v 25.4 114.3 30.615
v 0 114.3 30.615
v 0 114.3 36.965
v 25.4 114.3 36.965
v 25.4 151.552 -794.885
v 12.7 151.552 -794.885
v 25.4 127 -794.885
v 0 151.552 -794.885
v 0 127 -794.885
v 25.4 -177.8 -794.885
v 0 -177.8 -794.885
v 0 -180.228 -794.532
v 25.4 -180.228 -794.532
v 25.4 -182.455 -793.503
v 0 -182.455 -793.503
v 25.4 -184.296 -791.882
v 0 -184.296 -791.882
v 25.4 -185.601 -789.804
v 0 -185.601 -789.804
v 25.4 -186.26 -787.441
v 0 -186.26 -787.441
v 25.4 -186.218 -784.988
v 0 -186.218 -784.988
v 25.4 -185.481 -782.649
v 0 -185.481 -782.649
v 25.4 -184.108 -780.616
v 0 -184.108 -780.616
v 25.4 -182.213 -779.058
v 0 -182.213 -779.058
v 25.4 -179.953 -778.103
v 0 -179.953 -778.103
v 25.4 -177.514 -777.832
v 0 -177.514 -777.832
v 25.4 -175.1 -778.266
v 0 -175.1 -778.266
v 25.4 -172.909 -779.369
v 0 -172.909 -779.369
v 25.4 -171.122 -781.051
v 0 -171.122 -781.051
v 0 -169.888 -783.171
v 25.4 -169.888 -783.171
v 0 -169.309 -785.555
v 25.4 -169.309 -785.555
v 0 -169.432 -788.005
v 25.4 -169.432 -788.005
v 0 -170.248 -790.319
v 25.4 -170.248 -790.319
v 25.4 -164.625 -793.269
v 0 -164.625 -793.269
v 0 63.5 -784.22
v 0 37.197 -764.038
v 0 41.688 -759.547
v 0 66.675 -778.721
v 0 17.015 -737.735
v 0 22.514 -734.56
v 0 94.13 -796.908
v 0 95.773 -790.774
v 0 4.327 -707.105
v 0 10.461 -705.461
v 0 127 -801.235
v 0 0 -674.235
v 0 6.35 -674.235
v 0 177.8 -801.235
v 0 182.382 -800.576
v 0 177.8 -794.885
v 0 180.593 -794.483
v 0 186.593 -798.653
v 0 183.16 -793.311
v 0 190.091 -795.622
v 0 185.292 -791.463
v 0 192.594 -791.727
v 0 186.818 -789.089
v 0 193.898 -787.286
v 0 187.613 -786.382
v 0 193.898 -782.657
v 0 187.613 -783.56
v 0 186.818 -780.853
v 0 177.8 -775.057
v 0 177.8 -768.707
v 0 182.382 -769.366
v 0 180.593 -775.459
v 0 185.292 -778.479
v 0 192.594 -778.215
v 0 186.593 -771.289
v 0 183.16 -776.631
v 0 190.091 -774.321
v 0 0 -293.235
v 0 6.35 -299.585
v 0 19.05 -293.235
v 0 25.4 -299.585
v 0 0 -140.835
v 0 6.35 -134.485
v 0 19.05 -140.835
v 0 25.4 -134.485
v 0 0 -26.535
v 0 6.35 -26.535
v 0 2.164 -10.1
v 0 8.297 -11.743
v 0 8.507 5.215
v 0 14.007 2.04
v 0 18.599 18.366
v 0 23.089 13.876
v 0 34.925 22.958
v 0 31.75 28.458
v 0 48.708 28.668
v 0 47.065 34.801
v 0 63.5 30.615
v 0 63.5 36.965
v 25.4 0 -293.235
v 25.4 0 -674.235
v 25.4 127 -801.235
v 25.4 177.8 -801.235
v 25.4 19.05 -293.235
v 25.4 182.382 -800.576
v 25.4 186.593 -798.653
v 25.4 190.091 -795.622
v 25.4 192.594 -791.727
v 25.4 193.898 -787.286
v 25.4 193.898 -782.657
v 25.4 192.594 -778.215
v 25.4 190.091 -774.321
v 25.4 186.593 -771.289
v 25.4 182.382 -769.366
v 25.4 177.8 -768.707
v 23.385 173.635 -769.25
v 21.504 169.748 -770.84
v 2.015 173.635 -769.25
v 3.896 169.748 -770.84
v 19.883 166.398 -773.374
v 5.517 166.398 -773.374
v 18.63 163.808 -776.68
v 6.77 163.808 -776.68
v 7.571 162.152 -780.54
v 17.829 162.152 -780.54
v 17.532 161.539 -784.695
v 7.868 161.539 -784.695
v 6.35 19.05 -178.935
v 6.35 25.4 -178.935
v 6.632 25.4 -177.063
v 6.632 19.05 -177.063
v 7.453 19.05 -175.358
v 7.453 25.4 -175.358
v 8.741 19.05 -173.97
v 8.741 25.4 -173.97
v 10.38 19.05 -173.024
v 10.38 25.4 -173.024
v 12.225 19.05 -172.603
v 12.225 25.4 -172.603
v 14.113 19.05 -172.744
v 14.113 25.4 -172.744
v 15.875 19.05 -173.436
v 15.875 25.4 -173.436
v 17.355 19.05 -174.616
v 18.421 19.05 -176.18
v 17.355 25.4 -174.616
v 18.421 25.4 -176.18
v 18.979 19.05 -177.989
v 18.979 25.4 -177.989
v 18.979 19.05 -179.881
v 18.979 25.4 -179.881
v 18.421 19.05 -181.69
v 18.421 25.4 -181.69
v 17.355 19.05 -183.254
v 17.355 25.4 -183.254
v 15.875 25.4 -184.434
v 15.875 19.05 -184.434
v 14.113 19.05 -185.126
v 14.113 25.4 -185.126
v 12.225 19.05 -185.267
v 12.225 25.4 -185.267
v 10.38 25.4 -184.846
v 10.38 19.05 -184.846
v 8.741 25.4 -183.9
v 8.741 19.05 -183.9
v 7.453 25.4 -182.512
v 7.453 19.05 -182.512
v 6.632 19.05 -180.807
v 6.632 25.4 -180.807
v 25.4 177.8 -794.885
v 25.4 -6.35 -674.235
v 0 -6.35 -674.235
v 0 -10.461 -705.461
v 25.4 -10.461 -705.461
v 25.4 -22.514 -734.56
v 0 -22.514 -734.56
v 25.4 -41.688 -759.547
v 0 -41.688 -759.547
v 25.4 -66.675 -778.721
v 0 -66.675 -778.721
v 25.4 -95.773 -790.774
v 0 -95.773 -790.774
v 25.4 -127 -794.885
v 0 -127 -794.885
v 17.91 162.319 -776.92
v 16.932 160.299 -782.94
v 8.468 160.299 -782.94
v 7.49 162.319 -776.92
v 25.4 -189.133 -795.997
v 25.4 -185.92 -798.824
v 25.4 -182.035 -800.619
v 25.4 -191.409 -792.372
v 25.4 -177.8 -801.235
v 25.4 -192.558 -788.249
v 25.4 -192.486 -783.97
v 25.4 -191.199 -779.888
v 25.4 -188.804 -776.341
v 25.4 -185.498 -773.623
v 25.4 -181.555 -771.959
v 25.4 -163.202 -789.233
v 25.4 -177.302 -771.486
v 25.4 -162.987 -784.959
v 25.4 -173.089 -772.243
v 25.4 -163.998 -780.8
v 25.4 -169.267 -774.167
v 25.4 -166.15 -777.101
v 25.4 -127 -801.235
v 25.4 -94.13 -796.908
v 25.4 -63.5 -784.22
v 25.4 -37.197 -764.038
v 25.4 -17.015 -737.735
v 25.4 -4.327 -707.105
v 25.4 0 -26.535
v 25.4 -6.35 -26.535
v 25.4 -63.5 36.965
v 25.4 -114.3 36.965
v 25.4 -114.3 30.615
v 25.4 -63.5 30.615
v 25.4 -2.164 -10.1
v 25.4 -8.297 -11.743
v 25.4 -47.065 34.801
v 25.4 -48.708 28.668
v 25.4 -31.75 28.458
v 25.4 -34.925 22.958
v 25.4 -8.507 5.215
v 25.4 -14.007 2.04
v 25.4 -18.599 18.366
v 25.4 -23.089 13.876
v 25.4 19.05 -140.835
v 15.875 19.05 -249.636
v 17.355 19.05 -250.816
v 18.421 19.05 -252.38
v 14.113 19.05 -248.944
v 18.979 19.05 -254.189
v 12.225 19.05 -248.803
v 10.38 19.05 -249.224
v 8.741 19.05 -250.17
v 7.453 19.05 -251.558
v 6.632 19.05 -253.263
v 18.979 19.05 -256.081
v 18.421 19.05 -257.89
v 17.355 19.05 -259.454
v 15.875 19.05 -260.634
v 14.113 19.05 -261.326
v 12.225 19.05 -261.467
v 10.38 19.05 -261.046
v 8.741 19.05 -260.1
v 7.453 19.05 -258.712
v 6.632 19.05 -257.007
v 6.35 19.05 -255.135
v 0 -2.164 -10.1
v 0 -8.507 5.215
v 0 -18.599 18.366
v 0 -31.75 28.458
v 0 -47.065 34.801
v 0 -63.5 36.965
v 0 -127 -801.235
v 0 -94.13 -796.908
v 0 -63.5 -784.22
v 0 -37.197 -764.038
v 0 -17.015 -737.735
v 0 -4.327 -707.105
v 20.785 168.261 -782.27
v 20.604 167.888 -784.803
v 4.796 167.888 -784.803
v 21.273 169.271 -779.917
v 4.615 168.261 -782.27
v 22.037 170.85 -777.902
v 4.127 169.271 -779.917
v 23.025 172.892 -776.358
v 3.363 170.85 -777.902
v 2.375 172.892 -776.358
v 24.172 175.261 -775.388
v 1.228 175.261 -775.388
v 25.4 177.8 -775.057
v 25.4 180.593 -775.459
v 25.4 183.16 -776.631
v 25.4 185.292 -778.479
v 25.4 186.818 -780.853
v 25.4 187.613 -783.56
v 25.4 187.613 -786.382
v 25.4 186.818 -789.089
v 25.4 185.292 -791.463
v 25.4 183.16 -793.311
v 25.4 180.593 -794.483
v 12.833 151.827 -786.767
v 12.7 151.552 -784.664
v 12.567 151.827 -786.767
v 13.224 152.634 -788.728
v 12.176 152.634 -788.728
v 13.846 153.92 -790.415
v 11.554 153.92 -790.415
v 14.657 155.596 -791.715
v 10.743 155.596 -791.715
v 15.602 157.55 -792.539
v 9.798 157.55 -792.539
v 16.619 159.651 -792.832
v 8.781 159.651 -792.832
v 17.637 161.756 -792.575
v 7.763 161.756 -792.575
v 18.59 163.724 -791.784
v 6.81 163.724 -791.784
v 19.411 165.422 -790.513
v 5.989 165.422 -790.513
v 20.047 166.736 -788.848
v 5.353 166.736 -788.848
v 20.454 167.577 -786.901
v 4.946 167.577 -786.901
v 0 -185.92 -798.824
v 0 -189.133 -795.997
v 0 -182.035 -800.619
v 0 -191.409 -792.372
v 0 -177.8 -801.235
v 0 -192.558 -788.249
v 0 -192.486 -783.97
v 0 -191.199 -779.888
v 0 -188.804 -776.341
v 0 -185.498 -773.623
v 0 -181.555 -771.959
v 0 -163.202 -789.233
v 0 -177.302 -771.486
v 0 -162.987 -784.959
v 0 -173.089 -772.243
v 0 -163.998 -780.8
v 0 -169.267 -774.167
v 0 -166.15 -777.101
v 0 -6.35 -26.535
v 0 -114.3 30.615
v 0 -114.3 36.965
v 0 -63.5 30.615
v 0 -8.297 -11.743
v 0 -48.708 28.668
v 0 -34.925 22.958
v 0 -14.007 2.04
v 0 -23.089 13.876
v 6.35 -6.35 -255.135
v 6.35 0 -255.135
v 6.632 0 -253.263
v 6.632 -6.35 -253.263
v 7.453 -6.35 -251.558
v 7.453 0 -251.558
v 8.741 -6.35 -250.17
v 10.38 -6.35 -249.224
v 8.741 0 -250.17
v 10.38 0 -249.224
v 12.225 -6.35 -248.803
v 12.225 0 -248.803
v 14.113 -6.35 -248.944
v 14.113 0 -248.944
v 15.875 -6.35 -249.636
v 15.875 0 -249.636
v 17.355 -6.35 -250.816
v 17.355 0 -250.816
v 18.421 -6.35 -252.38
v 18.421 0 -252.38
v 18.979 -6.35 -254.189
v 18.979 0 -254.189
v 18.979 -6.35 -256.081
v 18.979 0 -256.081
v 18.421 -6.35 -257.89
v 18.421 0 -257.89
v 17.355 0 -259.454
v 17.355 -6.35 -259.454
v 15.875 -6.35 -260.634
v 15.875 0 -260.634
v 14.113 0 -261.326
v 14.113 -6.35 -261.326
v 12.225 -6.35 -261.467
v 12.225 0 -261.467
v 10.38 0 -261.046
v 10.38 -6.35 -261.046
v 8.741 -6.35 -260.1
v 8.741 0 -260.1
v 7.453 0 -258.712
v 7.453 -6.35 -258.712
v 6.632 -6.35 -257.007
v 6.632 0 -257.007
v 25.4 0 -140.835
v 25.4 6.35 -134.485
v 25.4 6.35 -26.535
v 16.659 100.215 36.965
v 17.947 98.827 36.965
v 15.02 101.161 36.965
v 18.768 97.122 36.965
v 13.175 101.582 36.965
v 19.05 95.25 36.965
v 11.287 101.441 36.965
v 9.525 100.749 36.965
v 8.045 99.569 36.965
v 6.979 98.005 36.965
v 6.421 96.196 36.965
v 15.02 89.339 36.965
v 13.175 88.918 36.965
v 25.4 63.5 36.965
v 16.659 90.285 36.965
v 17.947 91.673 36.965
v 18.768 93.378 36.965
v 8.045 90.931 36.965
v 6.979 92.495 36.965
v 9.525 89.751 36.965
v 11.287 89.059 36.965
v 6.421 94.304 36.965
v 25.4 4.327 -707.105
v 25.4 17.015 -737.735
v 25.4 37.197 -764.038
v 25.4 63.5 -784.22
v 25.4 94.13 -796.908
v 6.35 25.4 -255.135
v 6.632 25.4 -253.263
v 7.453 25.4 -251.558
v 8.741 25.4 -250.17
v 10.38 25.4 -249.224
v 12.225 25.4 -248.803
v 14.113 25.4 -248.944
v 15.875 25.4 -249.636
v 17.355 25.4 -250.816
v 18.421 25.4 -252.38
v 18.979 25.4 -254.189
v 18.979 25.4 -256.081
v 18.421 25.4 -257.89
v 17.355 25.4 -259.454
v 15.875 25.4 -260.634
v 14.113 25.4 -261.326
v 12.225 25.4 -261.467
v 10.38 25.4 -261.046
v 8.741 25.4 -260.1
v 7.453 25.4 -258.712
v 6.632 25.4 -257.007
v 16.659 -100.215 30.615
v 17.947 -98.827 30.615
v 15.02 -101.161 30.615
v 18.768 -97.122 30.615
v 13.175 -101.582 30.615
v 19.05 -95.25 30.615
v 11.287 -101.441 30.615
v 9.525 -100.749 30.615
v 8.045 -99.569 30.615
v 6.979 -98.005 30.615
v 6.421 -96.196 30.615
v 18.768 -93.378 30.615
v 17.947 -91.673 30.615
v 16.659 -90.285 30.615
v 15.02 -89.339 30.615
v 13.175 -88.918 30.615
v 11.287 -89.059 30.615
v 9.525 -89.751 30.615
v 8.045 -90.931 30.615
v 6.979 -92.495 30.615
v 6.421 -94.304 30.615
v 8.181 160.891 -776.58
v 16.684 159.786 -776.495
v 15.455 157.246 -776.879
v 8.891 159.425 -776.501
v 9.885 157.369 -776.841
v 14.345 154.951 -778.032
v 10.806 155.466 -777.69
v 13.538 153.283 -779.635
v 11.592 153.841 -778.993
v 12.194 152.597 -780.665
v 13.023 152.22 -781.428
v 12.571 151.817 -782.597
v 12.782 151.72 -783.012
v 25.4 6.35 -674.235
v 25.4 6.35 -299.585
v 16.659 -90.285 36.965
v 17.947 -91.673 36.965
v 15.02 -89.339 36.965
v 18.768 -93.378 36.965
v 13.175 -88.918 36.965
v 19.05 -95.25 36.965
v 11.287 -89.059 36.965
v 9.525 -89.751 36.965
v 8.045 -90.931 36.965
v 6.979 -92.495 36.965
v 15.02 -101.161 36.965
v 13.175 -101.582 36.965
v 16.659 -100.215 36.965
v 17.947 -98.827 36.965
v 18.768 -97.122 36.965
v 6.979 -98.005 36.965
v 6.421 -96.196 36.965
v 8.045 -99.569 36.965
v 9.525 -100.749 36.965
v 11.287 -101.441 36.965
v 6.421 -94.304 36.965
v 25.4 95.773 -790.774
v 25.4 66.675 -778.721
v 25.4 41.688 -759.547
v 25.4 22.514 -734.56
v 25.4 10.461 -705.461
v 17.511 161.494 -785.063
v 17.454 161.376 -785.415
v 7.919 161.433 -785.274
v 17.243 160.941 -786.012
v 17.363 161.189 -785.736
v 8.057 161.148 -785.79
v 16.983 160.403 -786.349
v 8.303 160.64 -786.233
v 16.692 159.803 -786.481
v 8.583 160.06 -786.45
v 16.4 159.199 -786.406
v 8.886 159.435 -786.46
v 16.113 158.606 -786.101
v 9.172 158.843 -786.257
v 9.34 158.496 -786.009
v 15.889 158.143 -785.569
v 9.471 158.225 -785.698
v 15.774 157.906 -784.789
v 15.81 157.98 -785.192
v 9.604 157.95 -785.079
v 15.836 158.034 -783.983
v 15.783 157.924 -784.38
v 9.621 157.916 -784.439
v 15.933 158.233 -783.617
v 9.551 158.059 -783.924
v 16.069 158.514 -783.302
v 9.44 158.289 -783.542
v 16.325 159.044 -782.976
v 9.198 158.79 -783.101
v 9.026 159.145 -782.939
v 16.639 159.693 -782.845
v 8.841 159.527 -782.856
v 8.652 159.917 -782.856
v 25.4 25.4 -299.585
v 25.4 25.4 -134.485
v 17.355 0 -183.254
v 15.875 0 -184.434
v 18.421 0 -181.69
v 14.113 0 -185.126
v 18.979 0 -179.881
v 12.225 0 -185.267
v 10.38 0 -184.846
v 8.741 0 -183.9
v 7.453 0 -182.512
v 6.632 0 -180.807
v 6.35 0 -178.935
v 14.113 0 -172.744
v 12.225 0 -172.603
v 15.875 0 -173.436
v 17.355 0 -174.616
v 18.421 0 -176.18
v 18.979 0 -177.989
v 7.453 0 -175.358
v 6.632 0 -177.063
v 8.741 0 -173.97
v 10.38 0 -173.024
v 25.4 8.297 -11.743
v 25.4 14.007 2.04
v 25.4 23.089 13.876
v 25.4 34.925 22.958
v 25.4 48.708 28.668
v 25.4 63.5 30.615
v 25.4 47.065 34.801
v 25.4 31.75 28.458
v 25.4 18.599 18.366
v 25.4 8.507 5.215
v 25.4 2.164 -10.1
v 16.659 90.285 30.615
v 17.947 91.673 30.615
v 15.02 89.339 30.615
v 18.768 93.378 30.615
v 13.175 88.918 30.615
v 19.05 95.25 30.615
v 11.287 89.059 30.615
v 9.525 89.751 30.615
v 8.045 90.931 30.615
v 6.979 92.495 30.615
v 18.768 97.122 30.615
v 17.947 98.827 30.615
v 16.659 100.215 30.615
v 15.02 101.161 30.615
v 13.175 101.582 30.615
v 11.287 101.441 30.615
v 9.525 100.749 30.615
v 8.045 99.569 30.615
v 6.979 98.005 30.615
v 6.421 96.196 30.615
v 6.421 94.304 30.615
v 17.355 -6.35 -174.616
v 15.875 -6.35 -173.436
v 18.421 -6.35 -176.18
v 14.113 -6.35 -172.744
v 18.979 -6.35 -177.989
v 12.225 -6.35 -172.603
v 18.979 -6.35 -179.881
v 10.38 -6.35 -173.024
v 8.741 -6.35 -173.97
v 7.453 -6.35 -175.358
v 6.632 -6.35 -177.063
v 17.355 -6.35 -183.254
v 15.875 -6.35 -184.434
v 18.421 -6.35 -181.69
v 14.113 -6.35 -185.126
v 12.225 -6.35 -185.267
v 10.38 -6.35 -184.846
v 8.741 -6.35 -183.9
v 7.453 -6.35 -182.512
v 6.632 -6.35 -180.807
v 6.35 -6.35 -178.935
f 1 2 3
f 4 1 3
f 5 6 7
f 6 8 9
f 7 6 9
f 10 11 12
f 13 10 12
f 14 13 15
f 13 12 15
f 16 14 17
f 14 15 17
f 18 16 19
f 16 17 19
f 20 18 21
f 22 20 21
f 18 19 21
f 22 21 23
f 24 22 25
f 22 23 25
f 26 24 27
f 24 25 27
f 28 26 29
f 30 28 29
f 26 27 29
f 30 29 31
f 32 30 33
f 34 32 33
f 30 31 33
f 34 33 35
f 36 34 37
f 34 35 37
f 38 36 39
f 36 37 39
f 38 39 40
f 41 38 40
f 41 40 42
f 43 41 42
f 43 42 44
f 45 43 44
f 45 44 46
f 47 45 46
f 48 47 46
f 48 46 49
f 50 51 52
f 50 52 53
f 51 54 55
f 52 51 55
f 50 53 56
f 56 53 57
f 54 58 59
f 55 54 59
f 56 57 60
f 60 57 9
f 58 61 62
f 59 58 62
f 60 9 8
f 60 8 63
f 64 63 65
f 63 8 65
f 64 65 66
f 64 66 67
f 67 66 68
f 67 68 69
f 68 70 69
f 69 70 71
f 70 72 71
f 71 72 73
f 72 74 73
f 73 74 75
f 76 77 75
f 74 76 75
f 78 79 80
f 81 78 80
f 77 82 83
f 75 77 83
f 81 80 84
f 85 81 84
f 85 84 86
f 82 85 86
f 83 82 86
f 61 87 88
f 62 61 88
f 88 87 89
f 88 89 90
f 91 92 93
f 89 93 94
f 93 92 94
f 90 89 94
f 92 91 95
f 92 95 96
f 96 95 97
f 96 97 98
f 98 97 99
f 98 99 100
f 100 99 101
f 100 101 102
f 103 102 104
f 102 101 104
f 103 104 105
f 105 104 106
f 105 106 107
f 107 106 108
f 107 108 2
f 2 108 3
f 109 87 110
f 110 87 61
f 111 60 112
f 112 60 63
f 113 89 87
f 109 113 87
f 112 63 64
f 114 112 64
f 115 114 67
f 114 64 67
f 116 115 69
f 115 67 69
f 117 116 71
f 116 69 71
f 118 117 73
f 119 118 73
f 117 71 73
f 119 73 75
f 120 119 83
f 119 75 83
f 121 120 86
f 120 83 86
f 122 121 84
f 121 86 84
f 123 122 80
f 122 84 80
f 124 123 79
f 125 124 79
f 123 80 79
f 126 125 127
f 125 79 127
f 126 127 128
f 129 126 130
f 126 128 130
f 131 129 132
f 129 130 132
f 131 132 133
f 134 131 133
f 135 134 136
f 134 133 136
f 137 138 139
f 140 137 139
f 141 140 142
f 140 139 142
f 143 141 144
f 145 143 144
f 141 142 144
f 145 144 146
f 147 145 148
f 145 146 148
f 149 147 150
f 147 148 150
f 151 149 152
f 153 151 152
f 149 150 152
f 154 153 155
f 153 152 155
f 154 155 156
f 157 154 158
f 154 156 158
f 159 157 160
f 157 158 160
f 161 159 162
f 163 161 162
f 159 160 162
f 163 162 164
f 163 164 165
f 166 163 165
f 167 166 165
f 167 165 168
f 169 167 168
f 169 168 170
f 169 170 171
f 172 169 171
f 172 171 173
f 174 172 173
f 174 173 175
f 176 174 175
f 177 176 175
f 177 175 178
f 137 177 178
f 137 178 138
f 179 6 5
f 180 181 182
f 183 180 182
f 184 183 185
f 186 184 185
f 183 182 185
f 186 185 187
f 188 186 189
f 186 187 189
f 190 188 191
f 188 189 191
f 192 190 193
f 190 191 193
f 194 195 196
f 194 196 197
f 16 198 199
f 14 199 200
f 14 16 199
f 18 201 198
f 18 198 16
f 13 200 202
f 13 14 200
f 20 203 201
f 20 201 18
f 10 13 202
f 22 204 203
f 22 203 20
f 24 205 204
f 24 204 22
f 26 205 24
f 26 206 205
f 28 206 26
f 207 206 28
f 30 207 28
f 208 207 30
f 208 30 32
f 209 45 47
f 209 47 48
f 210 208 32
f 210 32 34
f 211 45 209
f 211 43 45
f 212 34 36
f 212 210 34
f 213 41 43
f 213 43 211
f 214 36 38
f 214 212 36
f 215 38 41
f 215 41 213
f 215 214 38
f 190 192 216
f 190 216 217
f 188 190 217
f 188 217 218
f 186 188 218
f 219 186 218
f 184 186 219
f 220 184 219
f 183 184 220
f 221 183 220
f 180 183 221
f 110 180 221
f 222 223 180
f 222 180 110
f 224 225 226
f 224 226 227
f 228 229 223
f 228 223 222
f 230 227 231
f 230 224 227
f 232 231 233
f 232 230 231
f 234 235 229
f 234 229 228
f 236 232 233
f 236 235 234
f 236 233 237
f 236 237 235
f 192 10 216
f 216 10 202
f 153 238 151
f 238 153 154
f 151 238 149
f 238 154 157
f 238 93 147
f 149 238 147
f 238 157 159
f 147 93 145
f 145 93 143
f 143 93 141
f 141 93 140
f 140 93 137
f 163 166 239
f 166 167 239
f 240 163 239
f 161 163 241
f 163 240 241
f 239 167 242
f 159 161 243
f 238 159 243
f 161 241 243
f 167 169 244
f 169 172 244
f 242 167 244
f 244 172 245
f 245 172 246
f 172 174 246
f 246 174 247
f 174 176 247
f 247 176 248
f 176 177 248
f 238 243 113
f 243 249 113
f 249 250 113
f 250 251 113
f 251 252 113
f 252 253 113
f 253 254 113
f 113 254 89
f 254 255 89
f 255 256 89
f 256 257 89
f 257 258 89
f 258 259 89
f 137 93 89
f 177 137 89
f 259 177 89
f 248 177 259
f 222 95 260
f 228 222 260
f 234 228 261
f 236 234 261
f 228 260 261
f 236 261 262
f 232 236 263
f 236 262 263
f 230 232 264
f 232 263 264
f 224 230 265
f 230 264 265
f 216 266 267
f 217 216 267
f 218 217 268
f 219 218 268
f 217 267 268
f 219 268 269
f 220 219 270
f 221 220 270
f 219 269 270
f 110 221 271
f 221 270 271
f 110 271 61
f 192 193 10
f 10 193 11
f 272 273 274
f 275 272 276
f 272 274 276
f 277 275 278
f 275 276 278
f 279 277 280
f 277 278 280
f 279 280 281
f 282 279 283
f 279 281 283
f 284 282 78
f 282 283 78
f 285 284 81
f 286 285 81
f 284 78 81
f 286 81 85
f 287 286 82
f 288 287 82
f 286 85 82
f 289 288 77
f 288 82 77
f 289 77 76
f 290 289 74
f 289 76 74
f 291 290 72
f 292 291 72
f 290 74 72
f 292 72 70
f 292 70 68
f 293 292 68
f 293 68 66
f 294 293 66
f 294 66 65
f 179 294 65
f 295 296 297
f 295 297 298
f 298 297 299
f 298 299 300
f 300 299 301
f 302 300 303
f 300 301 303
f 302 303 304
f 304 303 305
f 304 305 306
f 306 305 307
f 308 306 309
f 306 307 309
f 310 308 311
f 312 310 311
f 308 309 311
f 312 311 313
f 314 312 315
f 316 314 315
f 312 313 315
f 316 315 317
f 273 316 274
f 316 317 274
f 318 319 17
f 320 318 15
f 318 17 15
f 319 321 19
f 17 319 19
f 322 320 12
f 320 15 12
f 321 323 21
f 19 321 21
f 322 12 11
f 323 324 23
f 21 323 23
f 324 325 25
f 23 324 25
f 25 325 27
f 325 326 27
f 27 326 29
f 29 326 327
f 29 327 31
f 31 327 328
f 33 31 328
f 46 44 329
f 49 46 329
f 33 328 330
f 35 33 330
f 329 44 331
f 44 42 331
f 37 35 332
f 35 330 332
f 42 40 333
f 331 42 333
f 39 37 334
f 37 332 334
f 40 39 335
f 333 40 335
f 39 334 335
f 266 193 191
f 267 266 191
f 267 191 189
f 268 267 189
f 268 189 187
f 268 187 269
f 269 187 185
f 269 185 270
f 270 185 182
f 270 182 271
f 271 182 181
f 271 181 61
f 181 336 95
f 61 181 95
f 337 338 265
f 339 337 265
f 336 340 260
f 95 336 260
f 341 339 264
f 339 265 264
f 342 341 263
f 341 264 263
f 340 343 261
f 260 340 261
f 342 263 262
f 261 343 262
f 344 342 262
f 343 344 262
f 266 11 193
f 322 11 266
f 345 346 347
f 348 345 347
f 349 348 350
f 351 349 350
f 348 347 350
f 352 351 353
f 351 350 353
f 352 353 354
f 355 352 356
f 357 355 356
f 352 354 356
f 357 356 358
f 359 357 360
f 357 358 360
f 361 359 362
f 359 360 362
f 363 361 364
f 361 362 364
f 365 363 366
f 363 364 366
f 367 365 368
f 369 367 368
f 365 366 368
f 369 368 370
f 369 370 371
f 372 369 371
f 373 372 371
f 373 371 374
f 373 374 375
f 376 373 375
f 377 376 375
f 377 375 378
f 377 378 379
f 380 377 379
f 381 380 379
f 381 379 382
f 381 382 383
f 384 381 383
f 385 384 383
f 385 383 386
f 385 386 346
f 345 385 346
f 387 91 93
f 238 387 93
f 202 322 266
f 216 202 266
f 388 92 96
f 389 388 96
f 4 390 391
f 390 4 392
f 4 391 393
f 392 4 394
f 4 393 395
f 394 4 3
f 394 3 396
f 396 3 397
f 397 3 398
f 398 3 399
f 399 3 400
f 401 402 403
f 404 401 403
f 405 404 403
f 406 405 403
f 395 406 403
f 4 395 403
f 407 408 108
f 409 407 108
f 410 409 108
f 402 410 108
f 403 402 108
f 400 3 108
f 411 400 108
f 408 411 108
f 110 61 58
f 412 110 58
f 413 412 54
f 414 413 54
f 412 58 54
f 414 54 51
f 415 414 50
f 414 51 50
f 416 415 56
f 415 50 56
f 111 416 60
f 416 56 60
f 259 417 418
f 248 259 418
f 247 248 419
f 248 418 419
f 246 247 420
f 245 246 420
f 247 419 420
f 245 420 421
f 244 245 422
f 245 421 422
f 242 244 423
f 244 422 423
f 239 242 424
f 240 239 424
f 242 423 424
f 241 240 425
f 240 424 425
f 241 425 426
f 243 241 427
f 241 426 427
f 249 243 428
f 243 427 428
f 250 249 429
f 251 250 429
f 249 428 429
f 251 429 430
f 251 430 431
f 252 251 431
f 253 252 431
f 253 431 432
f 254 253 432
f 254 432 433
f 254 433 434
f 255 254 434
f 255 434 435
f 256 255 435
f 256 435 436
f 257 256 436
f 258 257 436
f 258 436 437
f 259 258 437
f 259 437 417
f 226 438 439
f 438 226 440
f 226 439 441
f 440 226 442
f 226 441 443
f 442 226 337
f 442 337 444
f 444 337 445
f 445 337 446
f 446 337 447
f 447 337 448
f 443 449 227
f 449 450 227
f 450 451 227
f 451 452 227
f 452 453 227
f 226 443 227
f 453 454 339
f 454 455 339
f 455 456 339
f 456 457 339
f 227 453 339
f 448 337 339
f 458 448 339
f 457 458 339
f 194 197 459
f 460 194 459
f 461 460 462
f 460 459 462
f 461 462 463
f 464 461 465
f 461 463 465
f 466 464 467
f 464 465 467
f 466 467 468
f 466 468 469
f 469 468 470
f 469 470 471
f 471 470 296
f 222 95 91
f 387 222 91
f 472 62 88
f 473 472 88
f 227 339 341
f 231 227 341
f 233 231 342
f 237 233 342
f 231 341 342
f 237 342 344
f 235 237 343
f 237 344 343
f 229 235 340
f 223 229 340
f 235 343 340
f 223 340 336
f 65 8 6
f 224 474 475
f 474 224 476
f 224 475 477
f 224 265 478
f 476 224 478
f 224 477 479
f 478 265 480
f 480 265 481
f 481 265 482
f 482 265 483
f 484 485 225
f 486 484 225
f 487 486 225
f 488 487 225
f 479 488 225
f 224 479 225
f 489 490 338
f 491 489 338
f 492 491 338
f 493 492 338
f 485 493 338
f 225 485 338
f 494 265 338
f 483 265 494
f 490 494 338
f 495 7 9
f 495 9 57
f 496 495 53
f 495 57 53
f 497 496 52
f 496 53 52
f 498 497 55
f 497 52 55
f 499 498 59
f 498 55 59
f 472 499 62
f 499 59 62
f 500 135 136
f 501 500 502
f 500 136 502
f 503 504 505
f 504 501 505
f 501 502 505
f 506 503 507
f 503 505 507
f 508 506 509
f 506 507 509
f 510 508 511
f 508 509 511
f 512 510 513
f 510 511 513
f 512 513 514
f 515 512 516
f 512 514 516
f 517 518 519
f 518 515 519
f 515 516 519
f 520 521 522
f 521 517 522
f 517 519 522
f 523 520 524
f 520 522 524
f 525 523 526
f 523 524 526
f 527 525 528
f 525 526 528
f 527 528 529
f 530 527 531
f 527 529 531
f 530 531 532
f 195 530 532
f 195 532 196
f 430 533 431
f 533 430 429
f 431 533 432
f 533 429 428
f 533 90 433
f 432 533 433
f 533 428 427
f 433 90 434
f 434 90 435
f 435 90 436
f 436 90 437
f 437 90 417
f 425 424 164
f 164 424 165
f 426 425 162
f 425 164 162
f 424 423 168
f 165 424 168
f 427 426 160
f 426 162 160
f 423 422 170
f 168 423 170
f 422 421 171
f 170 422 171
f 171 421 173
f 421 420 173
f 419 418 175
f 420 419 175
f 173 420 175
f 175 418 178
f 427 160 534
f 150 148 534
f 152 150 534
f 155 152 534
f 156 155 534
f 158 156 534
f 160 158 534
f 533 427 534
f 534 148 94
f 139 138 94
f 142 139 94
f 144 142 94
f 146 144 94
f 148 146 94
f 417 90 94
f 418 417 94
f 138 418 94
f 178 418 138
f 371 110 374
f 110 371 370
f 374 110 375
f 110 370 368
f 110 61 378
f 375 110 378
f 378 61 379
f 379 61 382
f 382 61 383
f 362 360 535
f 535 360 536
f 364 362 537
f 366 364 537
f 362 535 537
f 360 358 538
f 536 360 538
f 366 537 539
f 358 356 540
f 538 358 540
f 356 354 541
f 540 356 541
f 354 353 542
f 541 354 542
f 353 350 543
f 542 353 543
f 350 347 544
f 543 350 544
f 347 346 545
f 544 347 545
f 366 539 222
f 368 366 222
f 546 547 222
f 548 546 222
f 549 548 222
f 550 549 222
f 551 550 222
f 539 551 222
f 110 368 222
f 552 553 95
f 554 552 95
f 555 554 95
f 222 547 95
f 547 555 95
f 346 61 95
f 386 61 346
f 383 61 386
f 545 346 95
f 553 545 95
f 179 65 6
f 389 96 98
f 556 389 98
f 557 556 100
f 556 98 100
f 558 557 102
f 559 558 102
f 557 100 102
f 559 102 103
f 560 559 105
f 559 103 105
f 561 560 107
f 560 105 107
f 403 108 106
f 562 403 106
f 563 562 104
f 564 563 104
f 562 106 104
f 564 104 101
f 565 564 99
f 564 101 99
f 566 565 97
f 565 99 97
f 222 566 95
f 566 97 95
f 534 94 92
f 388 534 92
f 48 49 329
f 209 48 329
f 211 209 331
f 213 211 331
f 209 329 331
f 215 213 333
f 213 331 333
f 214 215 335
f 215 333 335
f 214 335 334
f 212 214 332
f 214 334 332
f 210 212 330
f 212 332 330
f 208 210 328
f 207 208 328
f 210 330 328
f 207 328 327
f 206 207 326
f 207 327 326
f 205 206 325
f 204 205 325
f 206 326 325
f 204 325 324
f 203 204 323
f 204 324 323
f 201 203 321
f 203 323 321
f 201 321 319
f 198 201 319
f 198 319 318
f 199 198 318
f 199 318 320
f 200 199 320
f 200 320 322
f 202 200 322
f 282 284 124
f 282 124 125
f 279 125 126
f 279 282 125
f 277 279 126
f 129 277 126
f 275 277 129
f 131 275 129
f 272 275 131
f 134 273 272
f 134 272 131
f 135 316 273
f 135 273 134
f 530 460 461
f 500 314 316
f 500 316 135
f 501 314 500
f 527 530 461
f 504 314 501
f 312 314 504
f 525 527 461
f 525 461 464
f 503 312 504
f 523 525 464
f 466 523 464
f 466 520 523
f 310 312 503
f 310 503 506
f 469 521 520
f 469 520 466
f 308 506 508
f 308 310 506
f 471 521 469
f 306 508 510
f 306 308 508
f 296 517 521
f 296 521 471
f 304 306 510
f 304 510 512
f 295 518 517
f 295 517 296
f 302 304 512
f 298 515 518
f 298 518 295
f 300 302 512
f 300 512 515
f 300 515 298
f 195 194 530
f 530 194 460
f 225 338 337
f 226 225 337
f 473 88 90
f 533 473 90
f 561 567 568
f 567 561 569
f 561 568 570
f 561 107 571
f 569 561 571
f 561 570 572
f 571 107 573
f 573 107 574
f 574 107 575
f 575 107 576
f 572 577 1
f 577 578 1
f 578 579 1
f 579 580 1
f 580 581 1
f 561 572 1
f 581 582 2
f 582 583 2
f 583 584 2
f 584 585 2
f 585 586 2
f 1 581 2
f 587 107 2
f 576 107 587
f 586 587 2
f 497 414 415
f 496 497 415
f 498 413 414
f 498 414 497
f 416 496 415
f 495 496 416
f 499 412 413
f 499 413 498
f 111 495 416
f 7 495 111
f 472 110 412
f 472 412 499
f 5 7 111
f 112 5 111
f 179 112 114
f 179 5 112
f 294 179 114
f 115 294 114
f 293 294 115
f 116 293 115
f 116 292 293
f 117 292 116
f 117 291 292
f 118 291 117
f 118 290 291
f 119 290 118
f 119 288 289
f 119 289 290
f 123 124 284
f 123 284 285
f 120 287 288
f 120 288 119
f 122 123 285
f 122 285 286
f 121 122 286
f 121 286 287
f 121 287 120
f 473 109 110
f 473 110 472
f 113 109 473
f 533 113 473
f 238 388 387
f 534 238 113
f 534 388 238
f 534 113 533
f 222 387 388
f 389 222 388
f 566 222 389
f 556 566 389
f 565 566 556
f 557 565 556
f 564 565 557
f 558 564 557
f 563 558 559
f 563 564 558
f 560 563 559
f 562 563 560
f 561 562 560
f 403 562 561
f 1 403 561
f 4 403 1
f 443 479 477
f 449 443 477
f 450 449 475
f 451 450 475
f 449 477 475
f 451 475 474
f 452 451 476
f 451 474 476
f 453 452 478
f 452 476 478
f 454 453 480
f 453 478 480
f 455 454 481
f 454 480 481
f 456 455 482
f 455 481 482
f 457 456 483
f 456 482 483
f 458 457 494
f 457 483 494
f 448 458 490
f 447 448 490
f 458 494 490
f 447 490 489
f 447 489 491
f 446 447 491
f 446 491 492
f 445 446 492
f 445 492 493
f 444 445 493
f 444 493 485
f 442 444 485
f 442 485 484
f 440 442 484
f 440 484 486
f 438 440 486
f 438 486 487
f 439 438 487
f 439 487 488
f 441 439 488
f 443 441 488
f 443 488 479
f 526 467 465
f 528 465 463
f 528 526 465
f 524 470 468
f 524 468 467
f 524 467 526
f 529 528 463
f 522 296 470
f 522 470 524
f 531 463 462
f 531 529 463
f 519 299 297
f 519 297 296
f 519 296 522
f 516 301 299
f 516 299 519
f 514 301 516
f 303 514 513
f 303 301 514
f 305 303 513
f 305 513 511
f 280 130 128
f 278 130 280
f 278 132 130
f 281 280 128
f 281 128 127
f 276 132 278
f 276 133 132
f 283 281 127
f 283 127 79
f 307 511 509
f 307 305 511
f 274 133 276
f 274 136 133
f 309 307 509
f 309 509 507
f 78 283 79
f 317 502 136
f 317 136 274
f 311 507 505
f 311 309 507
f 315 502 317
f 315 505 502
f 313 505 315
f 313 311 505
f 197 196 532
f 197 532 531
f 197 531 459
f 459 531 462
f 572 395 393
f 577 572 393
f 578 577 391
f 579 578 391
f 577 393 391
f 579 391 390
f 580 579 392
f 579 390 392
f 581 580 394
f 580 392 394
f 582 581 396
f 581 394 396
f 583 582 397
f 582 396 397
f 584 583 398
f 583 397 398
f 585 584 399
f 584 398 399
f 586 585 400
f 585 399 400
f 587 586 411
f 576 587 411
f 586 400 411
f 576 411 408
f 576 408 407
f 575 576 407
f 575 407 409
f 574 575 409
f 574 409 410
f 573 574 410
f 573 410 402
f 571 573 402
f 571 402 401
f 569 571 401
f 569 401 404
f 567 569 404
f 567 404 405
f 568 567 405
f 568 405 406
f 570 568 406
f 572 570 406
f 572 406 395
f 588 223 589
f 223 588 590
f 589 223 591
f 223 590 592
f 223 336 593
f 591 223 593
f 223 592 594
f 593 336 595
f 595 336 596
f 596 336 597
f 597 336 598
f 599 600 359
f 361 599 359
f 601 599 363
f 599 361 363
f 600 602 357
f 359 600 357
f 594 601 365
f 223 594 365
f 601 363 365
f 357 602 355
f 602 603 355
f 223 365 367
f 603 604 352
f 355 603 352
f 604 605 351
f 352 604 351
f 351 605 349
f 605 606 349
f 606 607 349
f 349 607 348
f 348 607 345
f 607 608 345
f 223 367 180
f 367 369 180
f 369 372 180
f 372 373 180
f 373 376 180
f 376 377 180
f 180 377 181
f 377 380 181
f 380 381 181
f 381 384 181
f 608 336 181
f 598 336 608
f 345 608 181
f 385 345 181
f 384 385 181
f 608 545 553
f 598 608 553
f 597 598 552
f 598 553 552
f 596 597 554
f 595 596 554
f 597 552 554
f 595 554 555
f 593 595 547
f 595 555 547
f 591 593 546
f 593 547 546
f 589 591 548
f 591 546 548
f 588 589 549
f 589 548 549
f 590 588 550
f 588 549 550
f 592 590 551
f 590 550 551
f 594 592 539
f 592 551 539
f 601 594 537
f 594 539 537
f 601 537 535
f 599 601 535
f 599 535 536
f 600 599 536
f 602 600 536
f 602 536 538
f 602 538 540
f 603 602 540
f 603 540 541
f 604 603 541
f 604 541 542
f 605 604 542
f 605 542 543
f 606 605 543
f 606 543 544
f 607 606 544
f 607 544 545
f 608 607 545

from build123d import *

# Parameters (mm, degrees)
F1_DEPTH  = 25.4
F2_R      = 6.35
F3_DEPTH  = 25.4009999233
F4_DEPTH  = 25.4
F5_R      = 6.35
F6_DEPTH  = 192.6798458016
F7_R      = 6.35
F8_DEPTH  = 25.4
F10_DEPTH = 37.846


# Not quite as in the source:
# - ends of sketch curves that miss each other by under 0.0002 mm in the source are joined


with BuildPart() as f1:
    # F0 (on Right) → F1 (new body)
    with BuildSketch(Plane.YZ):
        with BuildLine():
            ThreePointArc((63.5, 36.9650529042), (18.5987193947, 18.3663335095), (0, -26.5349470958))
            Line((0, -26.5349470958), (0, -140.8349470958))
            Line((0, -140.8349470958), (19.05, -140.8349470958))
            Line((19.05, -140.8349470958), (19.05, -293.2349470958))
            Line((19.05, -293.2349470958), (0, -293.2349470958))
            Line((0, -293.2349470958), (0, -674.2349470958))
            ThreePointArc((0, -674.2349470958), (37.1974387893, -764.0375083065), (127, -801.2349470958))
            Line((127, -801.2349470958), (177.8, -801.2349470958))
            ThreePointArc((177.8, -801.2349470958), (189.3975515729, -773.5690950337), (161.5385711193, -784.6947312355))
            ThreePointArc((161.5385711193, -784.6947312355), (158.2348270865, -785.7130978667), (160.2988376632, -782.9396981457))
            Line((160.2988376632, -782.9396981457), (162.3191535473, -776.9196629524))
            ThreePointArc((162.3191535473, -776.9196629524), (153.0483347508, -789.3768114543), (167.8876675483, -784.8026632189))
            ThreePointArc((167.8876675483, -784.8026632189), (184.8694148503, -778.0209095625), (177.8, -794.8849333338))
            Line((177.8, -794.8849333338), (127, -794.8849471726))
            ThreePointArc((127, -794.8849471726), (41.6875667956, -759.5473803002), (6.3499999233, -674.2349470958))
            Line((6.3499999233, -674.2349470958), (6.3499999233, -299.5849470191))
            Line((6.3499999233, -299.5849470191), (25.3999999233, -299.5849470191))
            Line((25.3999999233, -299.5849470191), (25.3999999233, -134.4849471726))
            Line((25.3999999233, -134.4849471726), (6.3499999233, -134.4849471726))
            Line((6.3499999233, -134.4849471726), (6.35, -26.5349470958))
            ThreePointArc((6.35, -26.5349470958), (23.0888474552, 13.876205449), (63.5, 30.6150529042))
            Line((63.5, 30.6150529042), (114.3, 30.6150529383))
            Line((114.3, 30.6150529383), (114.3, 36.9650529042))
            Line((114.3, 36.9650529042), (63.5, 36.9650529042))
        make_face()
    extrude(amount=F1_DEPTH)

    # F2 (on face) → F3 (cut, through all)
    with BuildSketch(Plane(origin=(0, 25.3999999233, 0), x_dir=(-1, 0, 0), z_dir=(0, 1, 0))):
        with Locations((-12.7, -178.9349470958)):
            Circle(F2_R)
        with Locations((-12.7, -255.1349470958)):
            Circle(F2_R)
    extrude(amount=-F3_DEPTH, mode=Mode.SUBTRACT)


with BuildPart() as f4:
    # F0 (on Right) → F4 (new body)
    with BuildSketch(Plane.YZ):
        with BuildLine():
            Line((0, -140.8349470958), (0, -26.5349470958))
            ThreePointArc((0, -26.5349470958), (-18.5987193947, 18.3663335095), (-63.5, 36.9650529042))
            Line((-63.5, 36.9650529042), (-114.3, 36.9650529042))
            Line((-114.3, 36.9650529042), (-114.3, 30.6150529383))
            Line((-114.3, 30.6150529383), (-63.5, 30.6150529042))
            ThreePointArc((-63.5, 30.6150529042), (-23.0888474552, 13.876205449), (-6.35, -26.5349470958))
            Line((-6.35, -26.5349470958), (-6.3499999233, -674.2349470958))
            ThreePointArc((-6.3499999233, -674.2349470958), (-41.6875667956, -759.5473803002), (-127, -794.8849471726))
            Line((-127, -794.8849471726), (-177.8, -794.8849471726))
            ThreePointArc((-177.8, -794.8849471726), (-182.2126311124, -779.0574998673), (-170.2477224413, -790.3189285424))
            Line((-170.2477224413, -790.3189285424), (-164.6247804165, -793.2693958282))
            ThreePointArc((-164.6247804165, -793.2693958282), (-185.4979935384, -773.6234288382), (-177.8, -801.2349470958))
            Line((-177.8, -801.2349470958), (-127, -801.2349470958))
            ThreePointArc((-127, -801.2349470958), (-37.1974387893, -764.0375083065), (0, -674.2349470958))
            Line((0, -674.2349470958), (0, -293.2349470958))
            Line((0, -293.2349470958), (0, -140.8349470958))
        make_face()
    extrude(amount=F4_DEPTH)

    # F5 (on face) → F6 (cut, through all)
    with BuildSketch(Plane(origin=(0, 0, 0), x_dir=(-1, 0, 0), z_dir=(0, 1, 0))):
        with Locations((-12.7, -178.9349470958)):
            Circle(F5_R)
        with Locations((-12.7, -255.1349470958)):
            Circle(F5_R)
    extrude(amount=-F6_DEPTH, mode=Mode.SUBTRACT)


with BuildPart() as f8_tool:
    # F7 (on face) → F8 (new body)
    with BuildSketch(Plane.XY.offset(36.9650529042)):
        with Locations((12.7, 95.25)):
            Circle(F7_R)
        with Locations((12.7, -95.25)):
            Circle(F7_R)
    extrude(amount=-F8_DEPTH)


with BuildPart() as f1_1:
    add(f1.part)

    # F8: cut by f8_tool
    add(f8_tool.part, mode=Mode.SUBTRACT)

    # F9 (on face) → F10 (cut)
    with BuildSketch(Plane.XY.offset(-794.8849471726)):
        Polygon((0, 151.5516016069), (12.7, 151.5516016069), (0, 177.8), align=None)
        Polygon((12.7, 151.5516016069), (25.4, 151.5516016069), (25.4, 177.8), align=None)
    extrude(amount=F10_DEPTH, mode=Mode.SUBTRACT)


with BuildPart() as f4_1:
    add(f4.part)

    # F8: cut by f8_tool
    add(f8_tool.part, mode=Mode.SUBTRACT)


solid = Compound([f1_1.part, f4_1.part])
